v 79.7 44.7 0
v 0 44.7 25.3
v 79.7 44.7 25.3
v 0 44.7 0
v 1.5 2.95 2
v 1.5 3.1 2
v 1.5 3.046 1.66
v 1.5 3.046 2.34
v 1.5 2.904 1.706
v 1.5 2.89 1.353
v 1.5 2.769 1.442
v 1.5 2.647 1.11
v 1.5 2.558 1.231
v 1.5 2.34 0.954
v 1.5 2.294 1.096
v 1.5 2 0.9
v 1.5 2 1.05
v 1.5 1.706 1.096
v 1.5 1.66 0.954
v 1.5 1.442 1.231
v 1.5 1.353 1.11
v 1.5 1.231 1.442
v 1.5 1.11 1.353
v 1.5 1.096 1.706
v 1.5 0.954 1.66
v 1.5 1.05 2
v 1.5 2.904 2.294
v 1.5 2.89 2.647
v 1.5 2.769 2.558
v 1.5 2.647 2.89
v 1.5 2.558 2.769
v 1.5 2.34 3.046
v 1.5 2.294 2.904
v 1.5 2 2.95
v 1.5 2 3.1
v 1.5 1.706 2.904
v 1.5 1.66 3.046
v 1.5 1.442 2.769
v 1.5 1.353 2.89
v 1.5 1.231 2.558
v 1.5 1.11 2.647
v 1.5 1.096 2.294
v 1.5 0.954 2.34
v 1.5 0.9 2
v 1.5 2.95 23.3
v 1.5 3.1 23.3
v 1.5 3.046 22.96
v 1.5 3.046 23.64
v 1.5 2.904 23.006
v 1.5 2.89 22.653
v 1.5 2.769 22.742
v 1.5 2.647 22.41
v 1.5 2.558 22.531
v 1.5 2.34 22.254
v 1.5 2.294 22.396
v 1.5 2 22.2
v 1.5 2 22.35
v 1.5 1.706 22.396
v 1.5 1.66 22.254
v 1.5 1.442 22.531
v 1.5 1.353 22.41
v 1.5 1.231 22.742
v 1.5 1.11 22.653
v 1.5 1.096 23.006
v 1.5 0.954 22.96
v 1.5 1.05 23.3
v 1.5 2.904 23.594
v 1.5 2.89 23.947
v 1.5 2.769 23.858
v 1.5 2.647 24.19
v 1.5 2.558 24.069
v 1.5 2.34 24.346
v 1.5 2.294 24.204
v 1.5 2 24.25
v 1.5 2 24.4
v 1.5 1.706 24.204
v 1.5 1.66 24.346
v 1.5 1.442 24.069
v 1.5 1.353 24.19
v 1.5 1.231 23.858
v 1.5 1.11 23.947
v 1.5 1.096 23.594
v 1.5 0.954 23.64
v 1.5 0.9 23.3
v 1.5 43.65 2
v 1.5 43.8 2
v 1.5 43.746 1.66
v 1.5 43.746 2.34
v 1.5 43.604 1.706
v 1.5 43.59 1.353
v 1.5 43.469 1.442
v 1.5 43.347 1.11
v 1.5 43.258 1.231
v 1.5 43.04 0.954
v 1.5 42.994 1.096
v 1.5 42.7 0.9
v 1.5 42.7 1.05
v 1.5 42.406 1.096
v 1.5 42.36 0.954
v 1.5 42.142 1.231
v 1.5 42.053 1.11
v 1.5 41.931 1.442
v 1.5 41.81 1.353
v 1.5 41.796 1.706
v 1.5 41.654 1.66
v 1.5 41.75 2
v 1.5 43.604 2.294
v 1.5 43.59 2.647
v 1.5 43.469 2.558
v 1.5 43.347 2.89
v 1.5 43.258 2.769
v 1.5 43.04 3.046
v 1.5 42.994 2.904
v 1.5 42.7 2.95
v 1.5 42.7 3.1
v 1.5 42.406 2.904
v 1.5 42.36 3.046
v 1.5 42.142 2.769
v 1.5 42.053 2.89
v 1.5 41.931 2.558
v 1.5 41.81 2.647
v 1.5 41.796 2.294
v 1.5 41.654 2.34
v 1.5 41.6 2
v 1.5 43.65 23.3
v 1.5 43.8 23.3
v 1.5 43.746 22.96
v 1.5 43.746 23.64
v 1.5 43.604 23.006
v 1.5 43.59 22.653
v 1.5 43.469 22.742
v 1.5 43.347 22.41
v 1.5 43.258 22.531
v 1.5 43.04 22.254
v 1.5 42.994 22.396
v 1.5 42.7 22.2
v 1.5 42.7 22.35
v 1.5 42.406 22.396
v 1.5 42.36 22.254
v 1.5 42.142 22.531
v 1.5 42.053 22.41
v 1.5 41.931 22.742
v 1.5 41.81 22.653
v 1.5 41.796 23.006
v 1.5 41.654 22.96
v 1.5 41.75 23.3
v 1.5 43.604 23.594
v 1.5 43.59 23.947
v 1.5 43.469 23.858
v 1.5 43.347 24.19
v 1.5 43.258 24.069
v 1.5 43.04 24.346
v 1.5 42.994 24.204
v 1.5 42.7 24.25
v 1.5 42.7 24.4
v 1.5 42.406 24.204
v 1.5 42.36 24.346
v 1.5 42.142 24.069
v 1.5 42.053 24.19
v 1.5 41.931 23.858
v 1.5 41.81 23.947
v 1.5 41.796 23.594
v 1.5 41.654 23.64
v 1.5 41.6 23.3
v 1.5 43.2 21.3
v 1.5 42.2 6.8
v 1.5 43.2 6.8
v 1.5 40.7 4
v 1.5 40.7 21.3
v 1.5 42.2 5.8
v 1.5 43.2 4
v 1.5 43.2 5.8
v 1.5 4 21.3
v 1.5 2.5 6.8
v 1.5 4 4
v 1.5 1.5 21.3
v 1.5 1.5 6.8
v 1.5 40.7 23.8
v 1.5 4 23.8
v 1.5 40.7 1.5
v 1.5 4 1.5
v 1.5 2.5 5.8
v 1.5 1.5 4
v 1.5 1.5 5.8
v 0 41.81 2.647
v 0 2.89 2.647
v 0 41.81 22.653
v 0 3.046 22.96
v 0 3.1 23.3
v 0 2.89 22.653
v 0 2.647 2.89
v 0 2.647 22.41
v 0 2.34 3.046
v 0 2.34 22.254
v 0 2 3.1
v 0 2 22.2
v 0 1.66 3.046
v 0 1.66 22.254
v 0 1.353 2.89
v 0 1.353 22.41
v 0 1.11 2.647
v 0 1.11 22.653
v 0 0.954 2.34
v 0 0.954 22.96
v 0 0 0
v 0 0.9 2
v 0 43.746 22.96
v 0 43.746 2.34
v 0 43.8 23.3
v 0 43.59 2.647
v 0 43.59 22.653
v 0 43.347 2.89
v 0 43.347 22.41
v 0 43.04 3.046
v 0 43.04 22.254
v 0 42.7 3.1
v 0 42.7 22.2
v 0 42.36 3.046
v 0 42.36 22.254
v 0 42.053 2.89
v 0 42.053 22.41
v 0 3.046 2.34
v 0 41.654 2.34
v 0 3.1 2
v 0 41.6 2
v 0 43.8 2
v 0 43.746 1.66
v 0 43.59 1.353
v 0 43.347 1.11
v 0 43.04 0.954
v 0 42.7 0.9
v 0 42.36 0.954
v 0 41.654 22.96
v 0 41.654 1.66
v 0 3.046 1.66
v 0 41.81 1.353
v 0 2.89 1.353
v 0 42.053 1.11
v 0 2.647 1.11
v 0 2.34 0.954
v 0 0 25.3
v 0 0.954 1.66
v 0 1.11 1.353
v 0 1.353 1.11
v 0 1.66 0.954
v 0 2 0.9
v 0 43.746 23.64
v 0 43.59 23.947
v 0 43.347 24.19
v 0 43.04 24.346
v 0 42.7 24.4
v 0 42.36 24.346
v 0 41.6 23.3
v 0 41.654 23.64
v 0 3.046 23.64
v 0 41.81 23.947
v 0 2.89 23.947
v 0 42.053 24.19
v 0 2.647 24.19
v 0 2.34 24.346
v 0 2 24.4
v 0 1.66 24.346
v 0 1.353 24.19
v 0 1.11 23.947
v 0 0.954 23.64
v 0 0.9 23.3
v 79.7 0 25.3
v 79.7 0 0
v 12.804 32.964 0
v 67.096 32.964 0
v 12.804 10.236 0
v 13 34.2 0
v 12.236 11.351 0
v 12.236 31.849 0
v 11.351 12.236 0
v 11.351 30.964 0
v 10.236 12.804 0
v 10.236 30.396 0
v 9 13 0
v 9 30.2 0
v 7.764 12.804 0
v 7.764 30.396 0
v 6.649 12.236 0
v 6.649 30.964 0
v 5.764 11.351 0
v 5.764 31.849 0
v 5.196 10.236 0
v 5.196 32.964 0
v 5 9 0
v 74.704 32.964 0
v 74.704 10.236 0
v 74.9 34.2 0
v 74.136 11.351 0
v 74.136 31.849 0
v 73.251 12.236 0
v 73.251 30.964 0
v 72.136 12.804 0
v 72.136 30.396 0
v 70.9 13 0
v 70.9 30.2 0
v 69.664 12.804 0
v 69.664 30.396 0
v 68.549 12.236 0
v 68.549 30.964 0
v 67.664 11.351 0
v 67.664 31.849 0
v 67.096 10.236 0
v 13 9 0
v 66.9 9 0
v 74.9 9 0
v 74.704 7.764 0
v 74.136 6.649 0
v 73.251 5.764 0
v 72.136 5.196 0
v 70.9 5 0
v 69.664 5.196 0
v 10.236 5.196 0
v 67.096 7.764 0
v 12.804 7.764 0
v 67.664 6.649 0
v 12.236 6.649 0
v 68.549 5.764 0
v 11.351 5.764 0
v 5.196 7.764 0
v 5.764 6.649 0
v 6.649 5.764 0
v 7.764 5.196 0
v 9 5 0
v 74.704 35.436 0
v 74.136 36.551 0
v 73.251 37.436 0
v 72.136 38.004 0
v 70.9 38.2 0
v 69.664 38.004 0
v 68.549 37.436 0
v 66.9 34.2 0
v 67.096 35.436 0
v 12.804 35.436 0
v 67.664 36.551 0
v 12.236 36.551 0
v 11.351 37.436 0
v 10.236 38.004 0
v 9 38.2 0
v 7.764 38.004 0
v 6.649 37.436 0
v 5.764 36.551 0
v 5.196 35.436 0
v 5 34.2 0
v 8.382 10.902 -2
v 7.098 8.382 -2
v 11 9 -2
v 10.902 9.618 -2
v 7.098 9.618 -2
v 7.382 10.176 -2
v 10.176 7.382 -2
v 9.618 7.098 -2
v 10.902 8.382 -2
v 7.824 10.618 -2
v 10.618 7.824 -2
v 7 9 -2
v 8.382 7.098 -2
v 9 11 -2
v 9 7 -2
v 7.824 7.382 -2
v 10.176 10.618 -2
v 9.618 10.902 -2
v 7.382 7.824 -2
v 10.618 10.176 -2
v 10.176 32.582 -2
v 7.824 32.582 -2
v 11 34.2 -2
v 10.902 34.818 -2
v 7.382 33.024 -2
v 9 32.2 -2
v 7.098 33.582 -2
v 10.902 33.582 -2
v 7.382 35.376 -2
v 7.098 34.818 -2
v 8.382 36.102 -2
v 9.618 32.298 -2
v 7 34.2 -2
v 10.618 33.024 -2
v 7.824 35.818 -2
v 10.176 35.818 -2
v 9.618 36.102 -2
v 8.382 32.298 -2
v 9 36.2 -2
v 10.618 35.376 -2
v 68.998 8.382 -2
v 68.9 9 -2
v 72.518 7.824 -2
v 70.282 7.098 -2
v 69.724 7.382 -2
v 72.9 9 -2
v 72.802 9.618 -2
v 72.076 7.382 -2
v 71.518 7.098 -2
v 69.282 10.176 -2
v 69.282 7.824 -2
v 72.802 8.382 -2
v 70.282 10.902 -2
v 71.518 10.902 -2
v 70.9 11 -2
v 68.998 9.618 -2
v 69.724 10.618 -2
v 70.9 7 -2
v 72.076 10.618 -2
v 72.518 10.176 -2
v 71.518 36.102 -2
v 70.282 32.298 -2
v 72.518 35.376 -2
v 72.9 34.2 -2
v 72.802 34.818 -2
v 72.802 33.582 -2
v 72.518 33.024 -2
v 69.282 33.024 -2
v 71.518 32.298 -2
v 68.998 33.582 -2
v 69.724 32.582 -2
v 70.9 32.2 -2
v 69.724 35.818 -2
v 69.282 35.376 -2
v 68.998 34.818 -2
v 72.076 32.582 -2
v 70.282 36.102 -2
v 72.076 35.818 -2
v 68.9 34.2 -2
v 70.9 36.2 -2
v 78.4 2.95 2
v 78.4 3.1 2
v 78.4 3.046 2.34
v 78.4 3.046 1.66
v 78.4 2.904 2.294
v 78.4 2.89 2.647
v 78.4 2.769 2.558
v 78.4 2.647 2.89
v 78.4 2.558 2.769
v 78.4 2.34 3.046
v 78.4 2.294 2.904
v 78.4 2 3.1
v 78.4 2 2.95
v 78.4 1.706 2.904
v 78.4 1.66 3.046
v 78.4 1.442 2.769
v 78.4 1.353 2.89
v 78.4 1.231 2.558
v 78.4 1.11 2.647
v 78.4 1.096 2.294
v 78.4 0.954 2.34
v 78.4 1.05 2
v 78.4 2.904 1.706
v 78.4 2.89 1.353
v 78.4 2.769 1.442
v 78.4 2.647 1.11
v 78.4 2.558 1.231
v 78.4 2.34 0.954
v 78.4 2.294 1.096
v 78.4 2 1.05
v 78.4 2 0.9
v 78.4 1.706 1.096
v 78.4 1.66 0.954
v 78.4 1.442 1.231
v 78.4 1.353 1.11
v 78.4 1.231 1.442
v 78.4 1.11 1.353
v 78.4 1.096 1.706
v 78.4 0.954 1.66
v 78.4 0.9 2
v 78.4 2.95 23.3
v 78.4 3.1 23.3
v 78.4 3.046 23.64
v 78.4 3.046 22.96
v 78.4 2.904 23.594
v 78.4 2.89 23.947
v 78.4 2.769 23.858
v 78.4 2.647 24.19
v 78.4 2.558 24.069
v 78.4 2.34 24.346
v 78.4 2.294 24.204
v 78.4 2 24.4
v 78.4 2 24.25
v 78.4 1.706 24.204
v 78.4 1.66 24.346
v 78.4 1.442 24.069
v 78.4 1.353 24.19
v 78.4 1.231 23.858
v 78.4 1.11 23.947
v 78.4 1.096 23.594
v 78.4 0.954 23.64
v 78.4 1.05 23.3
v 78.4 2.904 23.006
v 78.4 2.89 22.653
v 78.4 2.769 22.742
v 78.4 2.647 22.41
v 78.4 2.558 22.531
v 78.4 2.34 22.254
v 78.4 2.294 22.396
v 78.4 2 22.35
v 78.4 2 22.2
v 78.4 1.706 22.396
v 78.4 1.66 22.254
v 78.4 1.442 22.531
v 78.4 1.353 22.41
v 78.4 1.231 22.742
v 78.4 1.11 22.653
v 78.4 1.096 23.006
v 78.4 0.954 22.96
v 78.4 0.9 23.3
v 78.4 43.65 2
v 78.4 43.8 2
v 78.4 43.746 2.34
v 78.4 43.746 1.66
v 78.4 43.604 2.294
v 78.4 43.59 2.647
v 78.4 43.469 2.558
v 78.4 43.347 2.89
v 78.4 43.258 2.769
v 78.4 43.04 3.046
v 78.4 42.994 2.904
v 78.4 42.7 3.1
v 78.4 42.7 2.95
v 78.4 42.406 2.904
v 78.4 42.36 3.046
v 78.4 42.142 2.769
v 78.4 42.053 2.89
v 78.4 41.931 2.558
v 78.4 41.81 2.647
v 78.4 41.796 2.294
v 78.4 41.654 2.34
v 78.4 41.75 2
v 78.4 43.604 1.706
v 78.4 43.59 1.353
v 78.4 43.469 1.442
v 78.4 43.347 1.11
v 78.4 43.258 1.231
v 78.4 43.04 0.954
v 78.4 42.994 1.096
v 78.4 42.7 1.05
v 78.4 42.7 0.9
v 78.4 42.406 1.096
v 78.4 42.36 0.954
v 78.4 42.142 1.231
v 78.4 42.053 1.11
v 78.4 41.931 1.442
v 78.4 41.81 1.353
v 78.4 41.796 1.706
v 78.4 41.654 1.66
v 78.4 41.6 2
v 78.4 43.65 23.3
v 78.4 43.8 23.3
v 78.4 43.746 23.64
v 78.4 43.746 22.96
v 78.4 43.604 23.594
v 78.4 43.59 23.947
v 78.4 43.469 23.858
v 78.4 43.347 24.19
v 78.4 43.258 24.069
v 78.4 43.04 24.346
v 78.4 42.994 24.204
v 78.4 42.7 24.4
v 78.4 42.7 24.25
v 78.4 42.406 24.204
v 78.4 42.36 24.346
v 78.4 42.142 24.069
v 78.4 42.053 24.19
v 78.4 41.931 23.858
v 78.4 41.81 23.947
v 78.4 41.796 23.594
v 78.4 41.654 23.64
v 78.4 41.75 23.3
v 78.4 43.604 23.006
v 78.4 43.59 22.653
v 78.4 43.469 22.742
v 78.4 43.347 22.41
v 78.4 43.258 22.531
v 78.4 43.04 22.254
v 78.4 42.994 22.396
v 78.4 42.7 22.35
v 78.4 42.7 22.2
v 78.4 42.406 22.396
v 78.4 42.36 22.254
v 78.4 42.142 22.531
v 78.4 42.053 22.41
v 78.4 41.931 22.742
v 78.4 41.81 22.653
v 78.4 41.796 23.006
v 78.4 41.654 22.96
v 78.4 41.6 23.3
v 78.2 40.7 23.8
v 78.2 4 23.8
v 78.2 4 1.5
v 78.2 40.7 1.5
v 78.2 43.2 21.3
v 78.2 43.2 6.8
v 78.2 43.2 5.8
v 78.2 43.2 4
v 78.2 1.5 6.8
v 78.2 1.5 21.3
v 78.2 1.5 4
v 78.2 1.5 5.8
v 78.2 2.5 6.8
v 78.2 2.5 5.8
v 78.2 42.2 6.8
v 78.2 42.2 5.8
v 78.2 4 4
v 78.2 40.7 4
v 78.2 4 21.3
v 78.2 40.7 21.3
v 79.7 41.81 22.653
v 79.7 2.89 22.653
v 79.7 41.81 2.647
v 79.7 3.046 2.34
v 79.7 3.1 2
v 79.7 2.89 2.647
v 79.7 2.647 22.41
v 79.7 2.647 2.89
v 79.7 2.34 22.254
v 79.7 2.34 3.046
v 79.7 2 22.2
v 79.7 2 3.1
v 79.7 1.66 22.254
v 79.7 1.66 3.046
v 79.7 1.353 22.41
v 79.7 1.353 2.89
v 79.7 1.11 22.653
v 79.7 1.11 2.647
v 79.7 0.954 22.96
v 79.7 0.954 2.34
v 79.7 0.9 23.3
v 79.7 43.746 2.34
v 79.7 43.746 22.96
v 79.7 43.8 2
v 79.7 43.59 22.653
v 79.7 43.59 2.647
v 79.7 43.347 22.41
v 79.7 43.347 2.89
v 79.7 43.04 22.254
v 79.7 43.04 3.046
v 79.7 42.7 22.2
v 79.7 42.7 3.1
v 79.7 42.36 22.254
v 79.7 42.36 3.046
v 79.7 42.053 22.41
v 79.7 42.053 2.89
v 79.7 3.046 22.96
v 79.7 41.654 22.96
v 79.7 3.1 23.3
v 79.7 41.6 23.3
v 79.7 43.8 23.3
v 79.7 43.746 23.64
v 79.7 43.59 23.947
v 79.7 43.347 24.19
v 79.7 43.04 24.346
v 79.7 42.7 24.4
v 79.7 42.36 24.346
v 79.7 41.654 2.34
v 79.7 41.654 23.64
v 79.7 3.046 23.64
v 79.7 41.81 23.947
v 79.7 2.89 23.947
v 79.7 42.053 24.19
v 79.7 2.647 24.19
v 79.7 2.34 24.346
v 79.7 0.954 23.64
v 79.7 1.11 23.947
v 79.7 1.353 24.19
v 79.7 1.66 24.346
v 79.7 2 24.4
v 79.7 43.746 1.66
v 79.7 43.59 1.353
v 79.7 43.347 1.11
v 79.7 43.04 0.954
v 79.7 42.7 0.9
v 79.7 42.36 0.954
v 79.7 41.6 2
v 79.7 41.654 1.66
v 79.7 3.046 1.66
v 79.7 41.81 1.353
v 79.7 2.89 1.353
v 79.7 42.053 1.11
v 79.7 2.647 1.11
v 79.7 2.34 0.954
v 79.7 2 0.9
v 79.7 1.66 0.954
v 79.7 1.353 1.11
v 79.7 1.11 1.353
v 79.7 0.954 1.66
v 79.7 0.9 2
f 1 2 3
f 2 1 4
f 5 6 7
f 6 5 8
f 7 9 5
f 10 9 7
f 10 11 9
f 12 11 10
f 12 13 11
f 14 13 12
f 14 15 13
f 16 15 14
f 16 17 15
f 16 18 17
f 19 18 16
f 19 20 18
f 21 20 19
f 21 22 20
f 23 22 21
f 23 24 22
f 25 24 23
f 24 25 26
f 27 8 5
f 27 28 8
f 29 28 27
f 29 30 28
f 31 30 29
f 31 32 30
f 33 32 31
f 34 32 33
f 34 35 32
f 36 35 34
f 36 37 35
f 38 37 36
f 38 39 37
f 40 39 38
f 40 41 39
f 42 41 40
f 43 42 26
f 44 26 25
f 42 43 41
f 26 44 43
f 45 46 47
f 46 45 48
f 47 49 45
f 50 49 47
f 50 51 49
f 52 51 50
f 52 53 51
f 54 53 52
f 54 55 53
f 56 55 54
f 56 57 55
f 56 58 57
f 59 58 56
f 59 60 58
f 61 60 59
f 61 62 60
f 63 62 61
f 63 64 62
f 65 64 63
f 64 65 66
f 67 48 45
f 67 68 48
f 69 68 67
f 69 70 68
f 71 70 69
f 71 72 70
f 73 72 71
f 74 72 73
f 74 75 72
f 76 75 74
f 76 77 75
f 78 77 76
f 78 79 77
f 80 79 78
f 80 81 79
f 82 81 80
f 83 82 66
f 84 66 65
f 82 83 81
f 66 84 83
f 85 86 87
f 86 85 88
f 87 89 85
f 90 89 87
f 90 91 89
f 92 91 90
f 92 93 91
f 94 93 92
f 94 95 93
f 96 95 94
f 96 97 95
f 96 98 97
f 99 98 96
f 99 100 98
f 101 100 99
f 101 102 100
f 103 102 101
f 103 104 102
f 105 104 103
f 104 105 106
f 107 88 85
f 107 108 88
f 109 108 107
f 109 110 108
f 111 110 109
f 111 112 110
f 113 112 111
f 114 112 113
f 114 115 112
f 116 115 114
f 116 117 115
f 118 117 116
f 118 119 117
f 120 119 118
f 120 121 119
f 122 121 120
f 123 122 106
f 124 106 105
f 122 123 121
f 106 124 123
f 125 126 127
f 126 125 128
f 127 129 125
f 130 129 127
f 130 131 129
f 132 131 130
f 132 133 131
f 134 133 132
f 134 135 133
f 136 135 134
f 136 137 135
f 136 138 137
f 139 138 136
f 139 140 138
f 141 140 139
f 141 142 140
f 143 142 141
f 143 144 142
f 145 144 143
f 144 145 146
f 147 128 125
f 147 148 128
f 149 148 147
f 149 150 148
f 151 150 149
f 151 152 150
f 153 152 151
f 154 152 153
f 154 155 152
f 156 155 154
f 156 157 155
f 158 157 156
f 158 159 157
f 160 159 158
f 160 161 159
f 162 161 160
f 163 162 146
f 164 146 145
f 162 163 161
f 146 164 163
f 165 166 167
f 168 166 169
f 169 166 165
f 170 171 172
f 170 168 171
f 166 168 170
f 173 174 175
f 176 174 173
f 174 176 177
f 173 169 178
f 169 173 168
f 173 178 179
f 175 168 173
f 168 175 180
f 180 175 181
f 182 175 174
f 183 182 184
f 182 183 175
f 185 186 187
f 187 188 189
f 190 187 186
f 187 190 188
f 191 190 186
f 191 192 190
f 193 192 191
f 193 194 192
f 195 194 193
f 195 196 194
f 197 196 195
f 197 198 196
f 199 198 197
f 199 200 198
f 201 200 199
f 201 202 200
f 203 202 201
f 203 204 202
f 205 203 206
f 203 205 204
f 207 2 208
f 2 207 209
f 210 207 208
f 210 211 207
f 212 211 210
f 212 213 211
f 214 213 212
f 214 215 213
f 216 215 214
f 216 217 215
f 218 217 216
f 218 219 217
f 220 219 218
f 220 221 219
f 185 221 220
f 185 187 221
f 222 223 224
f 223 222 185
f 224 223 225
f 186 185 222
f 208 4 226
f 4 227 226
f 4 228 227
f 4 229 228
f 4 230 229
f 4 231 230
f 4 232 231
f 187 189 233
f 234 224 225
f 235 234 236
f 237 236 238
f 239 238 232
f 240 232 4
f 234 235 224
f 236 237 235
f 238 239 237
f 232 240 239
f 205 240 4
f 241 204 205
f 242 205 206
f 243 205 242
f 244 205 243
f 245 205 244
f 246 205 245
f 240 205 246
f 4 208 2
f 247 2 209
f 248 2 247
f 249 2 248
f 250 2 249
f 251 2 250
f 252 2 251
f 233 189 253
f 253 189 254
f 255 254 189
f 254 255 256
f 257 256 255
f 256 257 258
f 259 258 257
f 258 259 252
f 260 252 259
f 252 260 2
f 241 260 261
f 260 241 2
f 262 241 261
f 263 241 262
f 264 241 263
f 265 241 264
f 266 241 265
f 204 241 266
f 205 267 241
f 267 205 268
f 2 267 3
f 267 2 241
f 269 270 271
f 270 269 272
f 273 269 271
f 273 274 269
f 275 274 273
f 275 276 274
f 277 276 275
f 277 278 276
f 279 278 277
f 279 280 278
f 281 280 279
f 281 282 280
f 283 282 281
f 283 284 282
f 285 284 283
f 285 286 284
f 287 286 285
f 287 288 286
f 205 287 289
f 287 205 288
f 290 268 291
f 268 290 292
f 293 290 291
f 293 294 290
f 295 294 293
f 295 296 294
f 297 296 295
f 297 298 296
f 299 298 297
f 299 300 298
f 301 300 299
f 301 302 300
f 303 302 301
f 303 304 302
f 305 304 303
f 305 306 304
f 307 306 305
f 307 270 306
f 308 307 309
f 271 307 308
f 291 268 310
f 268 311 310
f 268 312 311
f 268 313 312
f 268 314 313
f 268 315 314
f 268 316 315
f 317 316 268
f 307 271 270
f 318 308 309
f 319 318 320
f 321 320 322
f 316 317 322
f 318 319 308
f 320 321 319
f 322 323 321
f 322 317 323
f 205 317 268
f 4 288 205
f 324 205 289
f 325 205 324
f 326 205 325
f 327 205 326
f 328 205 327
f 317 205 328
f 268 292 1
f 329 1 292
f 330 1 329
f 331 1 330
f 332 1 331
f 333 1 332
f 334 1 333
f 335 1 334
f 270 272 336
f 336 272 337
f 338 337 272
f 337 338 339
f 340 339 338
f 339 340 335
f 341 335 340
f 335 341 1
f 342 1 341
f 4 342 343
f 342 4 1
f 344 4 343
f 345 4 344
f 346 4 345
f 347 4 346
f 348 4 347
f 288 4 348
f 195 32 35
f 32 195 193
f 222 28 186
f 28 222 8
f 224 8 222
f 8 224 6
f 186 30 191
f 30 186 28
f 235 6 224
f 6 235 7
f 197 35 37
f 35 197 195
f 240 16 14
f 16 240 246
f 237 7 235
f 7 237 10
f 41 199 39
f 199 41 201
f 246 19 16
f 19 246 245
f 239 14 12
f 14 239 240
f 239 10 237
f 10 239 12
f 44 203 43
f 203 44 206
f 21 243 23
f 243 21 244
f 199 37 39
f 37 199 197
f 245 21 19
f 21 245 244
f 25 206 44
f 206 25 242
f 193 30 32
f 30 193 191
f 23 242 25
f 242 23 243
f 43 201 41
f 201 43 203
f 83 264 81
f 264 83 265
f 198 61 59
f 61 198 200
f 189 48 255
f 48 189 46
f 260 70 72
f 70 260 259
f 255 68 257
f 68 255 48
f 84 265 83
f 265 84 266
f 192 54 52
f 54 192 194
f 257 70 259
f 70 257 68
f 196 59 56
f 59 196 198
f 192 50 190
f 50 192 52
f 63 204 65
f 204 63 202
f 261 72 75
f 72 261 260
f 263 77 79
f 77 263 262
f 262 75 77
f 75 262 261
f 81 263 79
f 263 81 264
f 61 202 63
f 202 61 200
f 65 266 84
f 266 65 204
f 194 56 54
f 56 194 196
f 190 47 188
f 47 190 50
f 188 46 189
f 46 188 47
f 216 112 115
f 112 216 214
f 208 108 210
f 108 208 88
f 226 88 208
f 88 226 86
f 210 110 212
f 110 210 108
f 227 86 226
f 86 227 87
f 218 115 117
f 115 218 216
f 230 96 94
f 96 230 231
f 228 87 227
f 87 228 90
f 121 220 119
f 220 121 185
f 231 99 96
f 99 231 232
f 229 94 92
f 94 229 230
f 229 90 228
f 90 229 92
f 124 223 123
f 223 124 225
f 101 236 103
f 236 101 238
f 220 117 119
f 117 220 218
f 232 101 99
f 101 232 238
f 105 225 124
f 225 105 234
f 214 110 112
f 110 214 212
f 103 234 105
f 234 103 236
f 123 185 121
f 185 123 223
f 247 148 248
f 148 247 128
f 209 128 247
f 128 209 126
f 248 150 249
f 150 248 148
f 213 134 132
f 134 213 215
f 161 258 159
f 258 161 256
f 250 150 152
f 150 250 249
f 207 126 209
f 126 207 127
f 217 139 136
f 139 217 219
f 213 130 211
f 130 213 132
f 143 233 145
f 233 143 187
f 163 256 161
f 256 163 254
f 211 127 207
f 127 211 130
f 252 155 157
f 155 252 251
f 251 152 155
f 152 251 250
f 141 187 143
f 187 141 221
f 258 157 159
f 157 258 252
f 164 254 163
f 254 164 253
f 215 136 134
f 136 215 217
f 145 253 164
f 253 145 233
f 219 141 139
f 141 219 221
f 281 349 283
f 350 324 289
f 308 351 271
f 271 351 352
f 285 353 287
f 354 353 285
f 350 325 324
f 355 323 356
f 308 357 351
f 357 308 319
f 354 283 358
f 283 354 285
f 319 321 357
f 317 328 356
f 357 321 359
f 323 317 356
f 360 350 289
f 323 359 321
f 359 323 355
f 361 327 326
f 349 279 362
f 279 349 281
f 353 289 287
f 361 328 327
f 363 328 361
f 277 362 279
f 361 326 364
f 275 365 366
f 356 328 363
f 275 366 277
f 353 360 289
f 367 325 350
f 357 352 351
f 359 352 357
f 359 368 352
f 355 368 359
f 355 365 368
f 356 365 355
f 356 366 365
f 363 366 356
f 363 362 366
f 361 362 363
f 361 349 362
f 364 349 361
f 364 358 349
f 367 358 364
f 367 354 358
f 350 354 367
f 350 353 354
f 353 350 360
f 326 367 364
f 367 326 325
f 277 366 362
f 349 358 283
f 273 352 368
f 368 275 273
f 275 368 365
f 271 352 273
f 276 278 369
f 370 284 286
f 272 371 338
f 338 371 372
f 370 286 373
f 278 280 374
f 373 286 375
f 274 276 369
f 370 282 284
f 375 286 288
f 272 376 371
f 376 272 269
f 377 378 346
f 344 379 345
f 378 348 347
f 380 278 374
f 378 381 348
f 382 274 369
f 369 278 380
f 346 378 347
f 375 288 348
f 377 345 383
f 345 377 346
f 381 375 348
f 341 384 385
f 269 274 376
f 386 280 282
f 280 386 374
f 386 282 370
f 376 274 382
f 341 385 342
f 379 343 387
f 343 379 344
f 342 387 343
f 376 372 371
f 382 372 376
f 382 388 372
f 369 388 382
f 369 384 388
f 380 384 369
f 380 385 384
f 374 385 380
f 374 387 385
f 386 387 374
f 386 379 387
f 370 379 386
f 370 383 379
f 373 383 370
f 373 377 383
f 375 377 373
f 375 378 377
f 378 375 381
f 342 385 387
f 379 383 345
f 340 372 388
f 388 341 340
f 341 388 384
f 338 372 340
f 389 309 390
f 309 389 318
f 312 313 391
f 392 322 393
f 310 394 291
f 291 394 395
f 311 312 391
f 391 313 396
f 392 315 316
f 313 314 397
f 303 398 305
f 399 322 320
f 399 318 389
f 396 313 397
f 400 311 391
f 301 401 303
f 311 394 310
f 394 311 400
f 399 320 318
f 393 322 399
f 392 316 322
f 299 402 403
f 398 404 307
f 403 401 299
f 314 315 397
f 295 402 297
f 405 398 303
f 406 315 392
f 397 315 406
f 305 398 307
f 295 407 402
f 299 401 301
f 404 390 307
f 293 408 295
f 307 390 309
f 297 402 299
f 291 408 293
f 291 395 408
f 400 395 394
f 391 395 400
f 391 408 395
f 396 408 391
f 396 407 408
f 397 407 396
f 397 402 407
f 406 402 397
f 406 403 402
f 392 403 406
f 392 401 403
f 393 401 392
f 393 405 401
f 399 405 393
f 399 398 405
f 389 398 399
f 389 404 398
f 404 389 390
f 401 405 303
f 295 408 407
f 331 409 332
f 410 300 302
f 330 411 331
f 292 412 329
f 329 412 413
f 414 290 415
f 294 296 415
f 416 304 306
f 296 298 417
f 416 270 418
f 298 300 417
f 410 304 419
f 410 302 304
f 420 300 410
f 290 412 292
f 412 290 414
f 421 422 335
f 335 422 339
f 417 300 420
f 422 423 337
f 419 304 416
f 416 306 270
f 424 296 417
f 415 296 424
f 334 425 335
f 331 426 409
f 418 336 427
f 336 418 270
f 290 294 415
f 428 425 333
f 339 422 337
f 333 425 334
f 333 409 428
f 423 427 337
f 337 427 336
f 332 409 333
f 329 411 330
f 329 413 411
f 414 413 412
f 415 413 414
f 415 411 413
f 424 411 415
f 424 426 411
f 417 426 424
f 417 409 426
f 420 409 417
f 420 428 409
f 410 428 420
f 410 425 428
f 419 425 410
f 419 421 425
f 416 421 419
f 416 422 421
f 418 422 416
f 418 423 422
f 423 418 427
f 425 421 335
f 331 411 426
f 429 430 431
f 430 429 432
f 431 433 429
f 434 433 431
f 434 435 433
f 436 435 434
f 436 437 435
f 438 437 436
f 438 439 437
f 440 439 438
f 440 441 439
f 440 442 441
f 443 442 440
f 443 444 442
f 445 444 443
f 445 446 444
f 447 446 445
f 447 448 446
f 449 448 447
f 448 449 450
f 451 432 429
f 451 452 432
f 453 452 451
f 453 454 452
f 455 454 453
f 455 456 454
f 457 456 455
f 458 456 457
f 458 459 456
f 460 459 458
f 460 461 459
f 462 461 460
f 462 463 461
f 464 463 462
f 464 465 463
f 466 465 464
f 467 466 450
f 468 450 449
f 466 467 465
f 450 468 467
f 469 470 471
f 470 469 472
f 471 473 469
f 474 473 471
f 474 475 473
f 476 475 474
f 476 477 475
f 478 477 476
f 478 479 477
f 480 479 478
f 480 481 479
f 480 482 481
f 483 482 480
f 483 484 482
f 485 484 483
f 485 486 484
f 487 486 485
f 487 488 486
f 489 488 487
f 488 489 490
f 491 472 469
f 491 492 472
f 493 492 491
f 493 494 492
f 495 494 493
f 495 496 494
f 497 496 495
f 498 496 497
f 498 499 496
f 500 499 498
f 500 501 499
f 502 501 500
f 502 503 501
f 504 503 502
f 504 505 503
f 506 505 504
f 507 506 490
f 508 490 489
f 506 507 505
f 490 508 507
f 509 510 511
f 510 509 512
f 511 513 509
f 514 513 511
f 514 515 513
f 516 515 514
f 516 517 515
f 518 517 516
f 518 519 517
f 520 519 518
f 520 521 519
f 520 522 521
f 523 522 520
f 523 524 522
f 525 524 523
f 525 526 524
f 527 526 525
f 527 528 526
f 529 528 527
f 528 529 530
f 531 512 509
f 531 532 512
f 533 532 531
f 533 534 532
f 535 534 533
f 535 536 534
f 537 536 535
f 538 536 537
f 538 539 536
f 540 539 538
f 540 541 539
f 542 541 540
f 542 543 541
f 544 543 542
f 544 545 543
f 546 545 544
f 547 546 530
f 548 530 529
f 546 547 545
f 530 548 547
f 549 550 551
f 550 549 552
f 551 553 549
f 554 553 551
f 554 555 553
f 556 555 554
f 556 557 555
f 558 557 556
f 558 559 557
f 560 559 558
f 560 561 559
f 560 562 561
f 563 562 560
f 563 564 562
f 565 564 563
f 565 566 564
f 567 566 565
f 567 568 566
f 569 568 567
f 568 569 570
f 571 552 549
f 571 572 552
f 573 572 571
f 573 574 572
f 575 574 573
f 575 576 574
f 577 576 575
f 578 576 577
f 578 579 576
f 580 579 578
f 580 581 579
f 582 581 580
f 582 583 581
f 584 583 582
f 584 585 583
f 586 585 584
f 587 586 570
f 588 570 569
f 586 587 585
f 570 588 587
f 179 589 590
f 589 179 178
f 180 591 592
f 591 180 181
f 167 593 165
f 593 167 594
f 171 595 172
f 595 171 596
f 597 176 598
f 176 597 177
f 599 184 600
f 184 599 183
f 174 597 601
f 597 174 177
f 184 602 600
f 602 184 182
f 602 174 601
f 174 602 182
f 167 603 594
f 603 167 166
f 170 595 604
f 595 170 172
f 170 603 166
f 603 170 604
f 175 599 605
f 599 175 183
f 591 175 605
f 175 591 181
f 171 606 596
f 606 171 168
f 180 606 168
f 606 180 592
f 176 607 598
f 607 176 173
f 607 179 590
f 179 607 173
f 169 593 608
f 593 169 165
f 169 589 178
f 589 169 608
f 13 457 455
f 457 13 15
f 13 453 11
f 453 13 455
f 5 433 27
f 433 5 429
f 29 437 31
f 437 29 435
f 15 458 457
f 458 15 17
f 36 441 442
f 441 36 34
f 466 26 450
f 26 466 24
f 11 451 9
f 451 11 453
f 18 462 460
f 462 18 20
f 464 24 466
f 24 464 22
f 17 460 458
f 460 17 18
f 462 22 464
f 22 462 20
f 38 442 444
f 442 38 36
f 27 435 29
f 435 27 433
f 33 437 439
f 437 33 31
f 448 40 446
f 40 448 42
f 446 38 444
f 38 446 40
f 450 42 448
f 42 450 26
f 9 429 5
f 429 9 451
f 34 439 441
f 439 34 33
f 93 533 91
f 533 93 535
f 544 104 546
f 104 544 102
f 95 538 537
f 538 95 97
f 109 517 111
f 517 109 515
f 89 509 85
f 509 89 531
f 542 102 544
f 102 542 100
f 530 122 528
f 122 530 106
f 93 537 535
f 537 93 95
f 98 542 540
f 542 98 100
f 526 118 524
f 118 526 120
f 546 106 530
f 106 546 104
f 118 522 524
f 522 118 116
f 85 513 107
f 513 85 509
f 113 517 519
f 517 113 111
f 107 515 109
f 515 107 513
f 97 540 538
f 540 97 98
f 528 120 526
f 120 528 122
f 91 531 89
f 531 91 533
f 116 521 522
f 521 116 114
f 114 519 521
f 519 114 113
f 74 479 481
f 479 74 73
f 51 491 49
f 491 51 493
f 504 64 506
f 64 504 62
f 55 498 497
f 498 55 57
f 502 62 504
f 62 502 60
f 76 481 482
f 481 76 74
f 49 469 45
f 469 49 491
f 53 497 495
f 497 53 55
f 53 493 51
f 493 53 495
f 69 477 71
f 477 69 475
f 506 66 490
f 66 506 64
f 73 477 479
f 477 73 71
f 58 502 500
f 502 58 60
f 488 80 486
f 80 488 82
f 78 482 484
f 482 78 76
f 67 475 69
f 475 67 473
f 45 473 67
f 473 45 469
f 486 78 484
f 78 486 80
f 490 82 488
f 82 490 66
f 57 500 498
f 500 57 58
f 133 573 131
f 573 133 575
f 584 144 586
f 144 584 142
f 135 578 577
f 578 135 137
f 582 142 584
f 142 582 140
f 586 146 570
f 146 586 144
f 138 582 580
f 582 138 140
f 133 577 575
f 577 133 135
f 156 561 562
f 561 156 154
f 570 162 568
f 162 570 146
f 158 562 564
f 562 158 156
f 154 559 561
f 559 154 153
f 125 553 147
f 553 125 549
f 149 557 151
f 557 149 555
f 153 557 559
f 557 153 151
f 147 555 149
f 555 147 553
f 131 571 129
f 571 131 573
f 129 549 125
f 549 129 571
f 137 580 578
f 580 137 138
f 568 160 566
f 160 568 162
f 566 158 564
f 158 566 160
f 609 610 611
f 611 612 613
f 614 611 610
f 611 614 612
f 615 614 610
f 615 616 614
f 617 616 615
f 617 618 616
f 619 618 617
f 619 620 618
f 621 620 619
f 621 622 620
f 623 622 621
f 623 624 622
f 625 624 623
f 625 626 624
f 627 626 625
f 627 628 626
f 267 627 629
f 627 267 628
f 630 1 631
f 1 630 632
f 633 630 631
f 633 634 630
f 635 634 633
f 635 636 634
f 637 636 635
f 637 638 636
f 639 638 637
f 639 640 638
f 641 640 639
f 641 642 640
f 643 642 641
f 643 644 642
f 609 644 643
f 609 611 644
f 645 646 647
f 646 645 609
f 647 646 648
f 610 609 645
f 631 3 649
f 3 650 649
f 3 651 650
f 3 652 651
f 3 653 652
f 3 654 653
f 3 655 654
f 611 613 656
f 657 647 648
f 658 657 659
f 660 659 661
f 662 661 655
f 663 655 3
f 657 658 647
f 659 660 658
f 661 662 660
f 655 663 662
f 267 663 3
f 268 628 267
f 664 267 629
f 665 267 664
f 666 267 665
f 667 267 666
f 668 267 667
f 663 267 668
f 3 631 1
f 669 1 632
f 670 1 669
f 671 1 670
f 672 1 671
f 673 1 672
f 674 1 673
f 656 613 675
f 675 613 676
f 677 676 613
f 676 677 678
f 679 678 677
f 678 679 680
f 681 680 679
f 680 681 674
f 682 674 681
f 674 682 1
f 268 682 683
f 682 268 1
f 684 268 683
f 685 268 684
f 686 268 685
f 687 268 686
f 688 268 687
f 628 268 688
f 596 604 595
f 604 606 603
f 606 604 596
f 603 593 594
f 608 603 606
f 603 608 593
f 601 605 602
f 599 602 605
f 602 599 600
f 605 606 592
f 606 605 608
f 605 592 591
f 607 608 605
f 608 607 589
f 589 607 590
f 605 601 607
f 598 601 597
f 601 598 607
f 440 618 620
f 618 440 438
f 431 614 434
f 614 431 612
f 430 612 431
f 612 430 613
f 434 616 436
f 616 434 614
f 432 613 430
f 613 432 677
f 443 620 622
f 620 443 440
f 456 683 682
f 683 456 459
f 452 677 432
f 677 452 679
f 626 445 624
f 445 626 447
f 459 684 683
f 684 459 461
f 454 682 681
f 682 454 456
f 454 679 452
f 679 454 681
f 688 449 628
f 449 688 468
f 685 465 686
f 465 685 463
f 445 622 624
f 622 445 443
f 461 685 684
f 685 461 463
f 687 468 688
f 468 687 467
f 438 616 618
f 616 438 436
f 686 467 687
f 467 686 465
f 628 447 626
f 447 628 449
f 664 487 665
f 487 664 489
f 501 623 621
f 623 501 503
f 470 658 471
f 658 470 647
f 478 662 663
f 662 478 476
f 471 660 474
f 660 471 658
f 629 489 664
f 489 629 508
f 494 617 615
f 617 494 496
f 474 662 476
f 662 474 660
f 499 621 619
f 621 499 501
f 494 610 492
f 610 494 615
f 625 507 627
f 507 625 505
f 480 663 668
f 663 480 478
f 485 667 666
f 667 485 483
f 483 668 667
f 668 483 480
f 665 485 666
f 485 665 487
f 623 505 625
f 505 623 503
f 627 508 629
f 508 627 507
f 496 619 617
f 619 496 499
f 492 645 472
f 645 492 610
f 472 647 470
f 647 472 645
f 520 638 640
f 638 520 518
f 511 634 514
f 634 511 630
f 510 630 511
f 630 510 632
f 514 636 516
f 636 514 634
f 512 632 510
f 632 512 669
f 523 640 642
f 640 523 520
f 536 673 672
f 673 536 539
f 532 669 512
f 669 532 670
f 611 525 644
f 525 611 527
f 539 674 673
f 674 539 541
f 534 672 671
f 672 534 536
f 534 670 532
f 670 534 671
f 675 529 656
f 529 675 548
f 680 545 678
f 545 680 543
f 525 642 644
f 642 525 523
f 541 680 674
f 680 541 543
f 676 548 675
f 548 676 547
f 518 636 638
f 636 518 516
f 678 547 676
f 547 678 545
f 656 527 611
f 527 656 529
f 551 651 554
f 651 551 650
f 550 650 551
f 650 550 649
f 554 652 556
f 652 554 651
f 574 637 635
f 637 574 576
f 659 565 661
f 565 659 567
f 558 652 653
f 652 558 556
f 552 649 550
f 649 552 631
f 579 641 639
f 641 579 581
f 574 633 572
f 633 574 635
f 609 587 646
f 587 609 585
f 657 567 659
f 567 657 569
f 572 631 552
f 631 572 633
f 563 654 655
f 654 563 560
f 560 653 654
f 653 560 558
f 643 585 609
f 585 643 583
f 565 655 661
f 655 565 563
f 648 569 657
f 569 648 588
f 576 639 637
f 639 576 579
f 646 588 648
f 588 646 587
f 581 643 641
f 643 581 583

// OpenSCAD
include <pcb-enclosure.scad>

pcb_length = 76.7;
pcb_width = 41.5;
pcb_height = 18;
pcb_thickness = 1.6;
pcb_clearance = 0.2;
pcb_holder_size = 1;
wall_thickness = 1.5;
foot_margin = 5;
foot_radius = 4;
bolt_size = 2;
bolt_hole_ratio_body = 0.95;
bolt_hole_ratio_end_cap = 1.1;

rotate([90, 0, 90]) {
    pcb_enclosure_end_cap(pcb_width, pcb_height, pcb_thickness, pcb_clearance,
                          wall_thickness, bolt_size, bolt_hole_ratio_end_cap);
    translate([0, 0, wall_thickness])
        pcb_enclosure_body(pcb_length, pcb_width, pcb_height, pcb_thickness,
                           pcb_clearance, pcb_holder_size, wall_thickness,
                           foot_margin, foot_radius, bolt_size,
                           bolt_hole_ratio_body);
    translate([0, 0, pcb_length + wall_thickness])
        pcb_enclosure_end_cap(pcb_width, pcb_height, pcb_thickness,
                              pcb_clearance, wall_thickness, bolt_size,
                              bolt_hole_ratio_end_cap);
}
